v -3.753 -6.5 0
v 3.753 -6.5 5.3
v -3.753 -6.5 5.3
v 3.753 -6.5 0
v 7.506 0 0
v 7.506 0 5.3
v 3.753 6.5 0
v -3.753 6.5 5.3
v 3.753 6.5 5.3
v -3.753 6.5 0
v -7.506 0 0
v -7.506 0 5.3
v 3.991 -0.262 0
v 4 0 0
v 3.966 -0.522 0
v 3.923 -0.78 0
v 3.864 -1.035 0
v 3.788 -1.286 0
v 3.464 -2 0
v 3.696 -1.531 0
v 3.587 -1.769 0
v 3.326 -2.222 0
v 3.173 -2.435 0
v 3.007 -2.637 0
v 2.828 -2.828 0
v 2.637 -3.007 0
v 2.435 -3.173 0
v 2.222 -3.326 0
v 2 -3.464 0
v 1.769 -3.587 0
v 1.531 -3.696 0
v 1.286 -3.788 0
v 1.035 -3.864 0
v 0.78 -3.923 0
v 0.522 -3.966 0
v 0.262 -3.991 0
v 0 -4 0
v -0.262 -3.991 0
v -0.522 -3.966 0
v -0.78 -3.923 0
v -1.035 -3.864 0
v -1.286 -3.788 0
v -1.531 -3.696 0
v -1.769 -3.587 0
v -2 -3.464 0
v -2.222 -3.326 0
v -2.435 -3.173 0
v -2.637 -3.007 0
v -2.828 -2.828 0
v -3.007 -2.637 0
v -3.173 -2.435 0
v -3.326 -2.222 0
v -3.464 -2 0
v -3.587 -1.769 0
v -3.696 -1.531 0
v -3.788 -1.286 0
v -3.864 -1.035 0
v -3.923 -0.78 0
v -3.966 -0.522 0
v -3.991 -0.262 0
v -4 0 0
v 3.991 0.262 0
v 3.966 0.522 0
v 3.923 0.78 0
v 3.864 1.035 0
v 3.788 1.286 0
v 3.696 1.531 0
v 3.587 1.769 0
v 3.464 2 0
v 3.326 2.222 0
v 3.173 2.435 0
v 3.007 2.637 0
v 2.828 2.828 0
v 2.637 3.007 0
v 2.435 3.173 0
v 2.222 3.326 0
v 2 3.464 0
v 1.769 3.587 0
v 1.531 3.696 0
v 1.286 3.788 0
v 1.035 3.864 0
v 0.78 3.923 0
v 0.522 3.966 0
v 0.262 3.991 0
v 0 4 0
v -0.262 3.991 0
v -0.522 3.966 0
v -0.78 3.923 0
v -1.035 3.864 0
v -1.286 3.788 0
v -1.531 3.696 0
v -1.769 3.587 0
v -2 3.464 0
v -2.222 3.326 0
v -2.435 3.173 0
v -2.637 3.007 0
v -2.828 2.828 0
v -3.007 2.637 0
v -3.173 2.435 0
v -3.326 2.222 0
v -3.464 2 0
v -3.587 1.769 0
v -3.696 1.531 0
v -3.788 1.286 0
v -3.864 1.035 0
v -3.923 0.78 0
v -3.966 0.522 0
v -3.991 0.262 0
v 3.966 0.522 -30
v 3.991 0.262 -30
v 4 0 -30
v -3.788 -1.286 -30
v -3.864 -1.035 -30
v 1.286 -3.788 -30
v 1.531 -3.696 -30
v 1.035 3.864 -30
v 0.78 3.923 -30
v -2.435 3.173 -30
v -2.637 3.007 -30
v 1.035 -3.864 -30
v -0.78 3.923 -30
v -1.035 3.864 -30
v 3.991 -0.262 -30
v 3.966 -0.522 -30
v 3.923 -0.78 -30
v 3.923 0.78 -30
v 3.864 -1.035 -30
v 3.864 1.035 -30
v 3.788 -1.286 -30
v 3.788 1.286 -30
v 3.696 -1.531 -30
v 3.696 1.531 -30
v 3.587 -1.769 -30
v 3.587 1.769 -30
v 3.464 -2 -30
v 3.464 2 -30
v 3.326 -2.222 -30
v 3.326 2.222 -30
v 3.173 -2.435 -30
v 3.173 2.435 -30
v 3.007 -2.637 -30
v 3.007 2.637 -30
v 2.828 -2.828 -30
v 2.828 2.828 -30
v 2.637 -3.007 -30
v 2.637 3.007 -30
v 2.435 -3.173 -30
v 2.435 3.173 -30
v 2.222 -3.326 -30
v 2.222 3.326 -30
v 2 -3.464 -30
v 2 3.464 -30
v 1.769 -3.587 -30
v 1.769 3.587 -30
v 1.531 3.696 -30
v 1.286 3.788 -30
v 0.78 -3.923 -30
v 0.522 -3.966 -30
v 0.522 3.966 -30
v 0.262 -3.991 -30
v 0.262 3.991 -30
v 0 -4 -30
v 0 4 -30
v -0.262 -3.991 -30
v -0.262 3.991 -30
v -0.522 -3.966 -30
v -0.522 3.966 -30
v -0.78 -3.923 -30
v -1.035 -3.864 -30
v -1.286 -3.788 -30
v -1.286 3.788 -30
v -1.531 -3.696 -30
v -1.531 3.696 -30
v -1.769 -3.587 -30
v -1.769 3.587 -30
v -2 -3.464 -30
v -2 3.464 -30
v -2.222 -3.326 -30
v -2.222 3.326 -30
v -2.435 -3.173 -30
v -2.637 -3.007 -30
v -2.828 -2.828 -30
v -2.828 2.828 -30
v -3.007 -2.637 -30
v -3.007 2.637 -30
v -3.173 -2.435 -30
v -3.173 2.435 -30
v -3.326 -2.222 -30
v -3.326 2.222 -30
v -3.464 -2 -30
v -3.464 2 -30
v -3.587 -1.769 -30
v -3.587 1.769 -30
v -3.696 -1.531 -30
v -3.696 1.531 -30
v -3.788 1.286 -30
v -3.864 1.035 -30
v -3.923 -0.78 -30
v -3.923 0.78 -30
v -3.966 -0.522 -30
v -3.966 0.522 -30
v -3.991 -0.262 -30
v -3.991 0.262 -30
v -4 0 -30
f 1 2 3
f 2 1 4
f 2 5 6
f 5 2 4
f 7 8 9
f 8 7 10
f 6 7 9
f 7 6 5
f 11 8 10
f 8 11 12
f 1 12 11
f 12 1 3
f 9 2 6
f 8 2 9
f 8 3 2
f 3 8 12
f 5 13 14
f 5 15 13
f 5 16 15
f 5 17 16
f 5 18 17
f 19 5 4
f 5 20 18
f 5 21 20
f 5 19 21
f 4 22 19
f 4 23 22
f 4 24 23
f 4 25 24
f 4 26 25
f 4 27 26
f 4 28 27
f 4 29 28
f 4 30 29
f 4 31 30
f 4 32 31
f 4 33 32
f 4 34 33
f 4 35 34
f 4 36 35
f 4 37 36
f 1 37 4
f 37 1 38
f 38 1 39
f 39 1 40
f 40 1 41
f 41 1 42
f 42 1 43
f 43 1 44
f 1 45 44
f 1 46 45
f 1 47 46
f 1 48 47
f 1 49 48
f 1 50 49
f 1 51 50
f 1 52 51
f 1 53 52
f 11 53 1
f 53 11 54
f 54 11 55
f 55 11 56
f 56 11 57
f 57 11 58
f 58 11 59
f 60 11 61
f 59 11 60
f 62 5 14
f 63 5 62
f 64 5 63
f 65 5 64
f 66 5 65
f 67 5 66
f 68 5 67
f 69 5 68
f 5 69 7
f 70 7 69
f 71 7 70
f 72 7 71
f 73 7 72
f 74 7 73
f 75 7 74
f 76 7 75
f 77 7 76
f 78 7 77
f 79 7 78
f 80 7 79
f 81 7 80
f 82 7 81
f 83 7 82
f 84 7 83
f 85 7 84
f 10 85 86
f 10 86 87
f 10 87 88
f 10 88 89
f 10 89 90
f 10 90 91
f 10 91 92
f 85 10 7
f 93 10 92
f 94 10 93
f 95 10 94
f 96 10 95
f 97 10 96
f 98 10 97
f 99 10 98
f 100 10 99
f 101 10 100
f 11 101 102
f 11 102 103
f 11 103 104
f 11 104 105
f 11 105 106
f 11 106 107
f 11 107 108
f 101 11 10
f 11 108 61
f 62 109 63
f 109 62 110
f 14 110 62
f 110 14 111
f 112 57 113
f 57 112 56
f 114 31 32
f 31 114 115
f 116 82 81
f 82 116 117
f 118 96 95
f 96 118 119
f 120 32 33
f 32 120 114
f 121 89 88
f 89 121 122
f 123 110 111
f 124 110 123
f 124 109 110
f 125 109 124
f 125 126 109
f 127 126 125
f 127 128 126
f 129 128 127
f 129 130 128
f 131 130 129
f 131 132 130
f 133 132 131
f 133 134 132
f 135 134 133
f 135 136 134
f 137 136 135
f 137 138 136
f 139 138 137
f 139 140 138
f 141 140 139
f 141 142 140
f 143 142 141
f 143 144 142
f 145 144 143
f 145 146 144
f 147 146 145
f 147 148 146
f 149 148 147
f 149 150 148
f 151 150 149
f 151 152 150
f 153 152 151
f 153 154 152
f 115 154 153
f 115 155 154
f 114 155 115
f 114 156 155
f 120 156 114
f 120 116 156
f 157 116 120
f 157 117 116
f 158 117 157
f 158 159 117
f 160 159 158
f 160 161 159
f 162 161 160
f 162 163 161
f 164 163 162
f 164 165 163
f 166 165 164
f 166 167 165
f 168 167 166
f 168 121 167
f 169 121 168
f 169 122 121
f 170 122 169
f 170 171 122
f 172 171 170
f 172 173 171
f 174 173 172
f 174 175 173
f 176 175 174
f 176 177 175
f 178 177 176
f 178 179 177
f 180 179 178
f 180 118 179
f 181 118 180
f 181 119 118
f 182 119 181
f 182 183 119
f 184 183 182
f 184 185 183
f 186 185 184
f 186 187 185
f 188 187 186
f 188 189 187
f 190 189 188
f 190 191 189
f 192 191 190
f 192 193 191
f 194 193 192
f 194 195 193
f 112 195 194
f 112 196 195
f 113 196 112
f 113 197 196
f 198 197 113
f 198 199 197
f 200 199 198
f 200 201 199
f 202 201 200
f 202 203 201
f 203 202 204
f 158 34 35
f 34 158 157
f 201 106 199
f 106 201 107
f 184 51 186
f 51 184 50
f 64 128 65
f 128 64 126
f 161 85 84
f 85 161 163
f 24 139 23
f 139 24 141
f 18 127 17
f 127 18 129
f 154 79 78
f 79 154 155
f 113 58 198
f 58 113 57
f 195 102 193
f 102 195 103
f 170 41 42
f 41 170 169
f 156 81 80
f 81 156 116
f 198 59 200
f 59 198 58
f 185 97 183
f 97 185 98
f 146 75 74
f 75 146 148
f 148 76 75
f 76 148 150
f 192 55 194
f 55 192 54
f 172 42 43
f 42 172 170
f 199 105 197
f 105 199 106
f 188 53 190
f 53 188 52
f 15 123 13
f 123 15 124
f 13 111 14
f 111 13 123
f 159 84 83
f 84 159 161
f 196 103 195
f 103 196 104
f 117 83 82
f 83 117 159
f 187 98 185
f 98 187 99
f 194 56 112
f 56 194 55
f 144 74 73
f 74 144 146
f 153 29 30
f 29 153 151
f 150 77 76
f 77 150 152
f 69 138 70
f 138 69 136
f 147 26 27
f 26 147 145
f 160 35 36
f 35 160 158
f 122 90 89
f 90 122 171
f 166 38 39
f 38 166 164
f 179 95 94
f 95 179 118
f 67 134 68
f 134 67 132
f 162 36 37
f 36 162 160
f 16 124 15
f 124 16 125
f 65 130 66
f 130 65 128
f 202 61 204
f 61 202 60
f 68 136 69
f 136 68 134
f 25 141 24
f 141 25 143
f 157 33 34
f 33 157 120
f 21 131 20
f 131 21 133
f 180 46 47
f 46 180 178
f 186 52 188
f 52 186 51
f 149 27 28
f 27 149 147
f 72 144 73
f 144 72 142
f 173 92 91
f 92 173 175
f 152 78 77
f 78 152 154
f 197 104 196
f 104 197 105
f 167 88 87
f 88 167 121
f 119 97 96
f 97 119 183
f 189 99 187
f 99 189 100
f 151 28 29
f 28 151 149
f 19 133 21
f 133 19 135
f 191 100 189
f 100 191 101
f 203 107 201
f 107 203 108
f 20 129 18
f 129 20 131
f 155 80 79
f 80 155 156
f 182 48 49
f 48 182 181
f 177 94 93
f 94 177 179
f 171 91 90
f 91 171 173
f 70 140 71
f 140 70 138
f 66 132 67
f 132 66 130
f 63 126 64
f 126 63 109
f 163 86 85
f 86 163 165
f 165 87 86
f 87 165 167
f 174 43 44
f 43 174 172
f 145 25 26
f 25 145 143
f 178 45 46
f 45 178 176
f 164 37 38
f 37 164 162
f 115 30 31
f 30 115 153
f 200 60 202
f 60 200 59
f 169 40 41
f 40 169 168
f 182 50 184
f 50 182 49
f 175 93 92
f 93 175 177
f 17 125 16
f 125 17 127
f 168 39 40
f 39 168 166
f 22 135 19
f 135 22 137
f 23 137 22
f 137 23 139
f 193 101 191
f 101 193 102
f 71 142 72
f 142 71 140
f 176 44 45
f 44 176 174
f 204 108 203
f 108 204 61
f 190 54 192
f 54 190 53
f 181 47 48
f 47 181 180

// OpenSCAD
// M8 六角ボルト (ねじ山省略・円柱シャンク)
// 中心軸: +Z, 頭部底面: z=0, シャンク: z<0 側

head_af = 13;    // 頭部 対辺距離 (across-flats) [mm]
head_h  = 5.3;   // 頭部 高さ [mm]
shank_d = 8;     // シャンク 直径 [mm]
shank_l = 30;    // シャンク 長さ [mm]

eps = 0.01;      // 面の共有による描画不具合を避けるための微小重なり

module hex_bolt_m8() {
    union() {
        // 頭部: 六角柱 (底面 z=0 ～ 上面 z=head_h)
        // cylinder の d は外接円直径なので、対辺距離から換算する
        cylinder(h = head_h, d = head_af / cos(30), $fn = 6);

        // シャンク: 円柱 (z = -shank_l ～ z = 0、頭部内へ eps だけ食い込ませる)
        translate([0, 0, -shank_l])
            cylinder(h = shank_l + eps, d = shank_d, $fn = 96);
    }
}

hex_bolt_m8();
